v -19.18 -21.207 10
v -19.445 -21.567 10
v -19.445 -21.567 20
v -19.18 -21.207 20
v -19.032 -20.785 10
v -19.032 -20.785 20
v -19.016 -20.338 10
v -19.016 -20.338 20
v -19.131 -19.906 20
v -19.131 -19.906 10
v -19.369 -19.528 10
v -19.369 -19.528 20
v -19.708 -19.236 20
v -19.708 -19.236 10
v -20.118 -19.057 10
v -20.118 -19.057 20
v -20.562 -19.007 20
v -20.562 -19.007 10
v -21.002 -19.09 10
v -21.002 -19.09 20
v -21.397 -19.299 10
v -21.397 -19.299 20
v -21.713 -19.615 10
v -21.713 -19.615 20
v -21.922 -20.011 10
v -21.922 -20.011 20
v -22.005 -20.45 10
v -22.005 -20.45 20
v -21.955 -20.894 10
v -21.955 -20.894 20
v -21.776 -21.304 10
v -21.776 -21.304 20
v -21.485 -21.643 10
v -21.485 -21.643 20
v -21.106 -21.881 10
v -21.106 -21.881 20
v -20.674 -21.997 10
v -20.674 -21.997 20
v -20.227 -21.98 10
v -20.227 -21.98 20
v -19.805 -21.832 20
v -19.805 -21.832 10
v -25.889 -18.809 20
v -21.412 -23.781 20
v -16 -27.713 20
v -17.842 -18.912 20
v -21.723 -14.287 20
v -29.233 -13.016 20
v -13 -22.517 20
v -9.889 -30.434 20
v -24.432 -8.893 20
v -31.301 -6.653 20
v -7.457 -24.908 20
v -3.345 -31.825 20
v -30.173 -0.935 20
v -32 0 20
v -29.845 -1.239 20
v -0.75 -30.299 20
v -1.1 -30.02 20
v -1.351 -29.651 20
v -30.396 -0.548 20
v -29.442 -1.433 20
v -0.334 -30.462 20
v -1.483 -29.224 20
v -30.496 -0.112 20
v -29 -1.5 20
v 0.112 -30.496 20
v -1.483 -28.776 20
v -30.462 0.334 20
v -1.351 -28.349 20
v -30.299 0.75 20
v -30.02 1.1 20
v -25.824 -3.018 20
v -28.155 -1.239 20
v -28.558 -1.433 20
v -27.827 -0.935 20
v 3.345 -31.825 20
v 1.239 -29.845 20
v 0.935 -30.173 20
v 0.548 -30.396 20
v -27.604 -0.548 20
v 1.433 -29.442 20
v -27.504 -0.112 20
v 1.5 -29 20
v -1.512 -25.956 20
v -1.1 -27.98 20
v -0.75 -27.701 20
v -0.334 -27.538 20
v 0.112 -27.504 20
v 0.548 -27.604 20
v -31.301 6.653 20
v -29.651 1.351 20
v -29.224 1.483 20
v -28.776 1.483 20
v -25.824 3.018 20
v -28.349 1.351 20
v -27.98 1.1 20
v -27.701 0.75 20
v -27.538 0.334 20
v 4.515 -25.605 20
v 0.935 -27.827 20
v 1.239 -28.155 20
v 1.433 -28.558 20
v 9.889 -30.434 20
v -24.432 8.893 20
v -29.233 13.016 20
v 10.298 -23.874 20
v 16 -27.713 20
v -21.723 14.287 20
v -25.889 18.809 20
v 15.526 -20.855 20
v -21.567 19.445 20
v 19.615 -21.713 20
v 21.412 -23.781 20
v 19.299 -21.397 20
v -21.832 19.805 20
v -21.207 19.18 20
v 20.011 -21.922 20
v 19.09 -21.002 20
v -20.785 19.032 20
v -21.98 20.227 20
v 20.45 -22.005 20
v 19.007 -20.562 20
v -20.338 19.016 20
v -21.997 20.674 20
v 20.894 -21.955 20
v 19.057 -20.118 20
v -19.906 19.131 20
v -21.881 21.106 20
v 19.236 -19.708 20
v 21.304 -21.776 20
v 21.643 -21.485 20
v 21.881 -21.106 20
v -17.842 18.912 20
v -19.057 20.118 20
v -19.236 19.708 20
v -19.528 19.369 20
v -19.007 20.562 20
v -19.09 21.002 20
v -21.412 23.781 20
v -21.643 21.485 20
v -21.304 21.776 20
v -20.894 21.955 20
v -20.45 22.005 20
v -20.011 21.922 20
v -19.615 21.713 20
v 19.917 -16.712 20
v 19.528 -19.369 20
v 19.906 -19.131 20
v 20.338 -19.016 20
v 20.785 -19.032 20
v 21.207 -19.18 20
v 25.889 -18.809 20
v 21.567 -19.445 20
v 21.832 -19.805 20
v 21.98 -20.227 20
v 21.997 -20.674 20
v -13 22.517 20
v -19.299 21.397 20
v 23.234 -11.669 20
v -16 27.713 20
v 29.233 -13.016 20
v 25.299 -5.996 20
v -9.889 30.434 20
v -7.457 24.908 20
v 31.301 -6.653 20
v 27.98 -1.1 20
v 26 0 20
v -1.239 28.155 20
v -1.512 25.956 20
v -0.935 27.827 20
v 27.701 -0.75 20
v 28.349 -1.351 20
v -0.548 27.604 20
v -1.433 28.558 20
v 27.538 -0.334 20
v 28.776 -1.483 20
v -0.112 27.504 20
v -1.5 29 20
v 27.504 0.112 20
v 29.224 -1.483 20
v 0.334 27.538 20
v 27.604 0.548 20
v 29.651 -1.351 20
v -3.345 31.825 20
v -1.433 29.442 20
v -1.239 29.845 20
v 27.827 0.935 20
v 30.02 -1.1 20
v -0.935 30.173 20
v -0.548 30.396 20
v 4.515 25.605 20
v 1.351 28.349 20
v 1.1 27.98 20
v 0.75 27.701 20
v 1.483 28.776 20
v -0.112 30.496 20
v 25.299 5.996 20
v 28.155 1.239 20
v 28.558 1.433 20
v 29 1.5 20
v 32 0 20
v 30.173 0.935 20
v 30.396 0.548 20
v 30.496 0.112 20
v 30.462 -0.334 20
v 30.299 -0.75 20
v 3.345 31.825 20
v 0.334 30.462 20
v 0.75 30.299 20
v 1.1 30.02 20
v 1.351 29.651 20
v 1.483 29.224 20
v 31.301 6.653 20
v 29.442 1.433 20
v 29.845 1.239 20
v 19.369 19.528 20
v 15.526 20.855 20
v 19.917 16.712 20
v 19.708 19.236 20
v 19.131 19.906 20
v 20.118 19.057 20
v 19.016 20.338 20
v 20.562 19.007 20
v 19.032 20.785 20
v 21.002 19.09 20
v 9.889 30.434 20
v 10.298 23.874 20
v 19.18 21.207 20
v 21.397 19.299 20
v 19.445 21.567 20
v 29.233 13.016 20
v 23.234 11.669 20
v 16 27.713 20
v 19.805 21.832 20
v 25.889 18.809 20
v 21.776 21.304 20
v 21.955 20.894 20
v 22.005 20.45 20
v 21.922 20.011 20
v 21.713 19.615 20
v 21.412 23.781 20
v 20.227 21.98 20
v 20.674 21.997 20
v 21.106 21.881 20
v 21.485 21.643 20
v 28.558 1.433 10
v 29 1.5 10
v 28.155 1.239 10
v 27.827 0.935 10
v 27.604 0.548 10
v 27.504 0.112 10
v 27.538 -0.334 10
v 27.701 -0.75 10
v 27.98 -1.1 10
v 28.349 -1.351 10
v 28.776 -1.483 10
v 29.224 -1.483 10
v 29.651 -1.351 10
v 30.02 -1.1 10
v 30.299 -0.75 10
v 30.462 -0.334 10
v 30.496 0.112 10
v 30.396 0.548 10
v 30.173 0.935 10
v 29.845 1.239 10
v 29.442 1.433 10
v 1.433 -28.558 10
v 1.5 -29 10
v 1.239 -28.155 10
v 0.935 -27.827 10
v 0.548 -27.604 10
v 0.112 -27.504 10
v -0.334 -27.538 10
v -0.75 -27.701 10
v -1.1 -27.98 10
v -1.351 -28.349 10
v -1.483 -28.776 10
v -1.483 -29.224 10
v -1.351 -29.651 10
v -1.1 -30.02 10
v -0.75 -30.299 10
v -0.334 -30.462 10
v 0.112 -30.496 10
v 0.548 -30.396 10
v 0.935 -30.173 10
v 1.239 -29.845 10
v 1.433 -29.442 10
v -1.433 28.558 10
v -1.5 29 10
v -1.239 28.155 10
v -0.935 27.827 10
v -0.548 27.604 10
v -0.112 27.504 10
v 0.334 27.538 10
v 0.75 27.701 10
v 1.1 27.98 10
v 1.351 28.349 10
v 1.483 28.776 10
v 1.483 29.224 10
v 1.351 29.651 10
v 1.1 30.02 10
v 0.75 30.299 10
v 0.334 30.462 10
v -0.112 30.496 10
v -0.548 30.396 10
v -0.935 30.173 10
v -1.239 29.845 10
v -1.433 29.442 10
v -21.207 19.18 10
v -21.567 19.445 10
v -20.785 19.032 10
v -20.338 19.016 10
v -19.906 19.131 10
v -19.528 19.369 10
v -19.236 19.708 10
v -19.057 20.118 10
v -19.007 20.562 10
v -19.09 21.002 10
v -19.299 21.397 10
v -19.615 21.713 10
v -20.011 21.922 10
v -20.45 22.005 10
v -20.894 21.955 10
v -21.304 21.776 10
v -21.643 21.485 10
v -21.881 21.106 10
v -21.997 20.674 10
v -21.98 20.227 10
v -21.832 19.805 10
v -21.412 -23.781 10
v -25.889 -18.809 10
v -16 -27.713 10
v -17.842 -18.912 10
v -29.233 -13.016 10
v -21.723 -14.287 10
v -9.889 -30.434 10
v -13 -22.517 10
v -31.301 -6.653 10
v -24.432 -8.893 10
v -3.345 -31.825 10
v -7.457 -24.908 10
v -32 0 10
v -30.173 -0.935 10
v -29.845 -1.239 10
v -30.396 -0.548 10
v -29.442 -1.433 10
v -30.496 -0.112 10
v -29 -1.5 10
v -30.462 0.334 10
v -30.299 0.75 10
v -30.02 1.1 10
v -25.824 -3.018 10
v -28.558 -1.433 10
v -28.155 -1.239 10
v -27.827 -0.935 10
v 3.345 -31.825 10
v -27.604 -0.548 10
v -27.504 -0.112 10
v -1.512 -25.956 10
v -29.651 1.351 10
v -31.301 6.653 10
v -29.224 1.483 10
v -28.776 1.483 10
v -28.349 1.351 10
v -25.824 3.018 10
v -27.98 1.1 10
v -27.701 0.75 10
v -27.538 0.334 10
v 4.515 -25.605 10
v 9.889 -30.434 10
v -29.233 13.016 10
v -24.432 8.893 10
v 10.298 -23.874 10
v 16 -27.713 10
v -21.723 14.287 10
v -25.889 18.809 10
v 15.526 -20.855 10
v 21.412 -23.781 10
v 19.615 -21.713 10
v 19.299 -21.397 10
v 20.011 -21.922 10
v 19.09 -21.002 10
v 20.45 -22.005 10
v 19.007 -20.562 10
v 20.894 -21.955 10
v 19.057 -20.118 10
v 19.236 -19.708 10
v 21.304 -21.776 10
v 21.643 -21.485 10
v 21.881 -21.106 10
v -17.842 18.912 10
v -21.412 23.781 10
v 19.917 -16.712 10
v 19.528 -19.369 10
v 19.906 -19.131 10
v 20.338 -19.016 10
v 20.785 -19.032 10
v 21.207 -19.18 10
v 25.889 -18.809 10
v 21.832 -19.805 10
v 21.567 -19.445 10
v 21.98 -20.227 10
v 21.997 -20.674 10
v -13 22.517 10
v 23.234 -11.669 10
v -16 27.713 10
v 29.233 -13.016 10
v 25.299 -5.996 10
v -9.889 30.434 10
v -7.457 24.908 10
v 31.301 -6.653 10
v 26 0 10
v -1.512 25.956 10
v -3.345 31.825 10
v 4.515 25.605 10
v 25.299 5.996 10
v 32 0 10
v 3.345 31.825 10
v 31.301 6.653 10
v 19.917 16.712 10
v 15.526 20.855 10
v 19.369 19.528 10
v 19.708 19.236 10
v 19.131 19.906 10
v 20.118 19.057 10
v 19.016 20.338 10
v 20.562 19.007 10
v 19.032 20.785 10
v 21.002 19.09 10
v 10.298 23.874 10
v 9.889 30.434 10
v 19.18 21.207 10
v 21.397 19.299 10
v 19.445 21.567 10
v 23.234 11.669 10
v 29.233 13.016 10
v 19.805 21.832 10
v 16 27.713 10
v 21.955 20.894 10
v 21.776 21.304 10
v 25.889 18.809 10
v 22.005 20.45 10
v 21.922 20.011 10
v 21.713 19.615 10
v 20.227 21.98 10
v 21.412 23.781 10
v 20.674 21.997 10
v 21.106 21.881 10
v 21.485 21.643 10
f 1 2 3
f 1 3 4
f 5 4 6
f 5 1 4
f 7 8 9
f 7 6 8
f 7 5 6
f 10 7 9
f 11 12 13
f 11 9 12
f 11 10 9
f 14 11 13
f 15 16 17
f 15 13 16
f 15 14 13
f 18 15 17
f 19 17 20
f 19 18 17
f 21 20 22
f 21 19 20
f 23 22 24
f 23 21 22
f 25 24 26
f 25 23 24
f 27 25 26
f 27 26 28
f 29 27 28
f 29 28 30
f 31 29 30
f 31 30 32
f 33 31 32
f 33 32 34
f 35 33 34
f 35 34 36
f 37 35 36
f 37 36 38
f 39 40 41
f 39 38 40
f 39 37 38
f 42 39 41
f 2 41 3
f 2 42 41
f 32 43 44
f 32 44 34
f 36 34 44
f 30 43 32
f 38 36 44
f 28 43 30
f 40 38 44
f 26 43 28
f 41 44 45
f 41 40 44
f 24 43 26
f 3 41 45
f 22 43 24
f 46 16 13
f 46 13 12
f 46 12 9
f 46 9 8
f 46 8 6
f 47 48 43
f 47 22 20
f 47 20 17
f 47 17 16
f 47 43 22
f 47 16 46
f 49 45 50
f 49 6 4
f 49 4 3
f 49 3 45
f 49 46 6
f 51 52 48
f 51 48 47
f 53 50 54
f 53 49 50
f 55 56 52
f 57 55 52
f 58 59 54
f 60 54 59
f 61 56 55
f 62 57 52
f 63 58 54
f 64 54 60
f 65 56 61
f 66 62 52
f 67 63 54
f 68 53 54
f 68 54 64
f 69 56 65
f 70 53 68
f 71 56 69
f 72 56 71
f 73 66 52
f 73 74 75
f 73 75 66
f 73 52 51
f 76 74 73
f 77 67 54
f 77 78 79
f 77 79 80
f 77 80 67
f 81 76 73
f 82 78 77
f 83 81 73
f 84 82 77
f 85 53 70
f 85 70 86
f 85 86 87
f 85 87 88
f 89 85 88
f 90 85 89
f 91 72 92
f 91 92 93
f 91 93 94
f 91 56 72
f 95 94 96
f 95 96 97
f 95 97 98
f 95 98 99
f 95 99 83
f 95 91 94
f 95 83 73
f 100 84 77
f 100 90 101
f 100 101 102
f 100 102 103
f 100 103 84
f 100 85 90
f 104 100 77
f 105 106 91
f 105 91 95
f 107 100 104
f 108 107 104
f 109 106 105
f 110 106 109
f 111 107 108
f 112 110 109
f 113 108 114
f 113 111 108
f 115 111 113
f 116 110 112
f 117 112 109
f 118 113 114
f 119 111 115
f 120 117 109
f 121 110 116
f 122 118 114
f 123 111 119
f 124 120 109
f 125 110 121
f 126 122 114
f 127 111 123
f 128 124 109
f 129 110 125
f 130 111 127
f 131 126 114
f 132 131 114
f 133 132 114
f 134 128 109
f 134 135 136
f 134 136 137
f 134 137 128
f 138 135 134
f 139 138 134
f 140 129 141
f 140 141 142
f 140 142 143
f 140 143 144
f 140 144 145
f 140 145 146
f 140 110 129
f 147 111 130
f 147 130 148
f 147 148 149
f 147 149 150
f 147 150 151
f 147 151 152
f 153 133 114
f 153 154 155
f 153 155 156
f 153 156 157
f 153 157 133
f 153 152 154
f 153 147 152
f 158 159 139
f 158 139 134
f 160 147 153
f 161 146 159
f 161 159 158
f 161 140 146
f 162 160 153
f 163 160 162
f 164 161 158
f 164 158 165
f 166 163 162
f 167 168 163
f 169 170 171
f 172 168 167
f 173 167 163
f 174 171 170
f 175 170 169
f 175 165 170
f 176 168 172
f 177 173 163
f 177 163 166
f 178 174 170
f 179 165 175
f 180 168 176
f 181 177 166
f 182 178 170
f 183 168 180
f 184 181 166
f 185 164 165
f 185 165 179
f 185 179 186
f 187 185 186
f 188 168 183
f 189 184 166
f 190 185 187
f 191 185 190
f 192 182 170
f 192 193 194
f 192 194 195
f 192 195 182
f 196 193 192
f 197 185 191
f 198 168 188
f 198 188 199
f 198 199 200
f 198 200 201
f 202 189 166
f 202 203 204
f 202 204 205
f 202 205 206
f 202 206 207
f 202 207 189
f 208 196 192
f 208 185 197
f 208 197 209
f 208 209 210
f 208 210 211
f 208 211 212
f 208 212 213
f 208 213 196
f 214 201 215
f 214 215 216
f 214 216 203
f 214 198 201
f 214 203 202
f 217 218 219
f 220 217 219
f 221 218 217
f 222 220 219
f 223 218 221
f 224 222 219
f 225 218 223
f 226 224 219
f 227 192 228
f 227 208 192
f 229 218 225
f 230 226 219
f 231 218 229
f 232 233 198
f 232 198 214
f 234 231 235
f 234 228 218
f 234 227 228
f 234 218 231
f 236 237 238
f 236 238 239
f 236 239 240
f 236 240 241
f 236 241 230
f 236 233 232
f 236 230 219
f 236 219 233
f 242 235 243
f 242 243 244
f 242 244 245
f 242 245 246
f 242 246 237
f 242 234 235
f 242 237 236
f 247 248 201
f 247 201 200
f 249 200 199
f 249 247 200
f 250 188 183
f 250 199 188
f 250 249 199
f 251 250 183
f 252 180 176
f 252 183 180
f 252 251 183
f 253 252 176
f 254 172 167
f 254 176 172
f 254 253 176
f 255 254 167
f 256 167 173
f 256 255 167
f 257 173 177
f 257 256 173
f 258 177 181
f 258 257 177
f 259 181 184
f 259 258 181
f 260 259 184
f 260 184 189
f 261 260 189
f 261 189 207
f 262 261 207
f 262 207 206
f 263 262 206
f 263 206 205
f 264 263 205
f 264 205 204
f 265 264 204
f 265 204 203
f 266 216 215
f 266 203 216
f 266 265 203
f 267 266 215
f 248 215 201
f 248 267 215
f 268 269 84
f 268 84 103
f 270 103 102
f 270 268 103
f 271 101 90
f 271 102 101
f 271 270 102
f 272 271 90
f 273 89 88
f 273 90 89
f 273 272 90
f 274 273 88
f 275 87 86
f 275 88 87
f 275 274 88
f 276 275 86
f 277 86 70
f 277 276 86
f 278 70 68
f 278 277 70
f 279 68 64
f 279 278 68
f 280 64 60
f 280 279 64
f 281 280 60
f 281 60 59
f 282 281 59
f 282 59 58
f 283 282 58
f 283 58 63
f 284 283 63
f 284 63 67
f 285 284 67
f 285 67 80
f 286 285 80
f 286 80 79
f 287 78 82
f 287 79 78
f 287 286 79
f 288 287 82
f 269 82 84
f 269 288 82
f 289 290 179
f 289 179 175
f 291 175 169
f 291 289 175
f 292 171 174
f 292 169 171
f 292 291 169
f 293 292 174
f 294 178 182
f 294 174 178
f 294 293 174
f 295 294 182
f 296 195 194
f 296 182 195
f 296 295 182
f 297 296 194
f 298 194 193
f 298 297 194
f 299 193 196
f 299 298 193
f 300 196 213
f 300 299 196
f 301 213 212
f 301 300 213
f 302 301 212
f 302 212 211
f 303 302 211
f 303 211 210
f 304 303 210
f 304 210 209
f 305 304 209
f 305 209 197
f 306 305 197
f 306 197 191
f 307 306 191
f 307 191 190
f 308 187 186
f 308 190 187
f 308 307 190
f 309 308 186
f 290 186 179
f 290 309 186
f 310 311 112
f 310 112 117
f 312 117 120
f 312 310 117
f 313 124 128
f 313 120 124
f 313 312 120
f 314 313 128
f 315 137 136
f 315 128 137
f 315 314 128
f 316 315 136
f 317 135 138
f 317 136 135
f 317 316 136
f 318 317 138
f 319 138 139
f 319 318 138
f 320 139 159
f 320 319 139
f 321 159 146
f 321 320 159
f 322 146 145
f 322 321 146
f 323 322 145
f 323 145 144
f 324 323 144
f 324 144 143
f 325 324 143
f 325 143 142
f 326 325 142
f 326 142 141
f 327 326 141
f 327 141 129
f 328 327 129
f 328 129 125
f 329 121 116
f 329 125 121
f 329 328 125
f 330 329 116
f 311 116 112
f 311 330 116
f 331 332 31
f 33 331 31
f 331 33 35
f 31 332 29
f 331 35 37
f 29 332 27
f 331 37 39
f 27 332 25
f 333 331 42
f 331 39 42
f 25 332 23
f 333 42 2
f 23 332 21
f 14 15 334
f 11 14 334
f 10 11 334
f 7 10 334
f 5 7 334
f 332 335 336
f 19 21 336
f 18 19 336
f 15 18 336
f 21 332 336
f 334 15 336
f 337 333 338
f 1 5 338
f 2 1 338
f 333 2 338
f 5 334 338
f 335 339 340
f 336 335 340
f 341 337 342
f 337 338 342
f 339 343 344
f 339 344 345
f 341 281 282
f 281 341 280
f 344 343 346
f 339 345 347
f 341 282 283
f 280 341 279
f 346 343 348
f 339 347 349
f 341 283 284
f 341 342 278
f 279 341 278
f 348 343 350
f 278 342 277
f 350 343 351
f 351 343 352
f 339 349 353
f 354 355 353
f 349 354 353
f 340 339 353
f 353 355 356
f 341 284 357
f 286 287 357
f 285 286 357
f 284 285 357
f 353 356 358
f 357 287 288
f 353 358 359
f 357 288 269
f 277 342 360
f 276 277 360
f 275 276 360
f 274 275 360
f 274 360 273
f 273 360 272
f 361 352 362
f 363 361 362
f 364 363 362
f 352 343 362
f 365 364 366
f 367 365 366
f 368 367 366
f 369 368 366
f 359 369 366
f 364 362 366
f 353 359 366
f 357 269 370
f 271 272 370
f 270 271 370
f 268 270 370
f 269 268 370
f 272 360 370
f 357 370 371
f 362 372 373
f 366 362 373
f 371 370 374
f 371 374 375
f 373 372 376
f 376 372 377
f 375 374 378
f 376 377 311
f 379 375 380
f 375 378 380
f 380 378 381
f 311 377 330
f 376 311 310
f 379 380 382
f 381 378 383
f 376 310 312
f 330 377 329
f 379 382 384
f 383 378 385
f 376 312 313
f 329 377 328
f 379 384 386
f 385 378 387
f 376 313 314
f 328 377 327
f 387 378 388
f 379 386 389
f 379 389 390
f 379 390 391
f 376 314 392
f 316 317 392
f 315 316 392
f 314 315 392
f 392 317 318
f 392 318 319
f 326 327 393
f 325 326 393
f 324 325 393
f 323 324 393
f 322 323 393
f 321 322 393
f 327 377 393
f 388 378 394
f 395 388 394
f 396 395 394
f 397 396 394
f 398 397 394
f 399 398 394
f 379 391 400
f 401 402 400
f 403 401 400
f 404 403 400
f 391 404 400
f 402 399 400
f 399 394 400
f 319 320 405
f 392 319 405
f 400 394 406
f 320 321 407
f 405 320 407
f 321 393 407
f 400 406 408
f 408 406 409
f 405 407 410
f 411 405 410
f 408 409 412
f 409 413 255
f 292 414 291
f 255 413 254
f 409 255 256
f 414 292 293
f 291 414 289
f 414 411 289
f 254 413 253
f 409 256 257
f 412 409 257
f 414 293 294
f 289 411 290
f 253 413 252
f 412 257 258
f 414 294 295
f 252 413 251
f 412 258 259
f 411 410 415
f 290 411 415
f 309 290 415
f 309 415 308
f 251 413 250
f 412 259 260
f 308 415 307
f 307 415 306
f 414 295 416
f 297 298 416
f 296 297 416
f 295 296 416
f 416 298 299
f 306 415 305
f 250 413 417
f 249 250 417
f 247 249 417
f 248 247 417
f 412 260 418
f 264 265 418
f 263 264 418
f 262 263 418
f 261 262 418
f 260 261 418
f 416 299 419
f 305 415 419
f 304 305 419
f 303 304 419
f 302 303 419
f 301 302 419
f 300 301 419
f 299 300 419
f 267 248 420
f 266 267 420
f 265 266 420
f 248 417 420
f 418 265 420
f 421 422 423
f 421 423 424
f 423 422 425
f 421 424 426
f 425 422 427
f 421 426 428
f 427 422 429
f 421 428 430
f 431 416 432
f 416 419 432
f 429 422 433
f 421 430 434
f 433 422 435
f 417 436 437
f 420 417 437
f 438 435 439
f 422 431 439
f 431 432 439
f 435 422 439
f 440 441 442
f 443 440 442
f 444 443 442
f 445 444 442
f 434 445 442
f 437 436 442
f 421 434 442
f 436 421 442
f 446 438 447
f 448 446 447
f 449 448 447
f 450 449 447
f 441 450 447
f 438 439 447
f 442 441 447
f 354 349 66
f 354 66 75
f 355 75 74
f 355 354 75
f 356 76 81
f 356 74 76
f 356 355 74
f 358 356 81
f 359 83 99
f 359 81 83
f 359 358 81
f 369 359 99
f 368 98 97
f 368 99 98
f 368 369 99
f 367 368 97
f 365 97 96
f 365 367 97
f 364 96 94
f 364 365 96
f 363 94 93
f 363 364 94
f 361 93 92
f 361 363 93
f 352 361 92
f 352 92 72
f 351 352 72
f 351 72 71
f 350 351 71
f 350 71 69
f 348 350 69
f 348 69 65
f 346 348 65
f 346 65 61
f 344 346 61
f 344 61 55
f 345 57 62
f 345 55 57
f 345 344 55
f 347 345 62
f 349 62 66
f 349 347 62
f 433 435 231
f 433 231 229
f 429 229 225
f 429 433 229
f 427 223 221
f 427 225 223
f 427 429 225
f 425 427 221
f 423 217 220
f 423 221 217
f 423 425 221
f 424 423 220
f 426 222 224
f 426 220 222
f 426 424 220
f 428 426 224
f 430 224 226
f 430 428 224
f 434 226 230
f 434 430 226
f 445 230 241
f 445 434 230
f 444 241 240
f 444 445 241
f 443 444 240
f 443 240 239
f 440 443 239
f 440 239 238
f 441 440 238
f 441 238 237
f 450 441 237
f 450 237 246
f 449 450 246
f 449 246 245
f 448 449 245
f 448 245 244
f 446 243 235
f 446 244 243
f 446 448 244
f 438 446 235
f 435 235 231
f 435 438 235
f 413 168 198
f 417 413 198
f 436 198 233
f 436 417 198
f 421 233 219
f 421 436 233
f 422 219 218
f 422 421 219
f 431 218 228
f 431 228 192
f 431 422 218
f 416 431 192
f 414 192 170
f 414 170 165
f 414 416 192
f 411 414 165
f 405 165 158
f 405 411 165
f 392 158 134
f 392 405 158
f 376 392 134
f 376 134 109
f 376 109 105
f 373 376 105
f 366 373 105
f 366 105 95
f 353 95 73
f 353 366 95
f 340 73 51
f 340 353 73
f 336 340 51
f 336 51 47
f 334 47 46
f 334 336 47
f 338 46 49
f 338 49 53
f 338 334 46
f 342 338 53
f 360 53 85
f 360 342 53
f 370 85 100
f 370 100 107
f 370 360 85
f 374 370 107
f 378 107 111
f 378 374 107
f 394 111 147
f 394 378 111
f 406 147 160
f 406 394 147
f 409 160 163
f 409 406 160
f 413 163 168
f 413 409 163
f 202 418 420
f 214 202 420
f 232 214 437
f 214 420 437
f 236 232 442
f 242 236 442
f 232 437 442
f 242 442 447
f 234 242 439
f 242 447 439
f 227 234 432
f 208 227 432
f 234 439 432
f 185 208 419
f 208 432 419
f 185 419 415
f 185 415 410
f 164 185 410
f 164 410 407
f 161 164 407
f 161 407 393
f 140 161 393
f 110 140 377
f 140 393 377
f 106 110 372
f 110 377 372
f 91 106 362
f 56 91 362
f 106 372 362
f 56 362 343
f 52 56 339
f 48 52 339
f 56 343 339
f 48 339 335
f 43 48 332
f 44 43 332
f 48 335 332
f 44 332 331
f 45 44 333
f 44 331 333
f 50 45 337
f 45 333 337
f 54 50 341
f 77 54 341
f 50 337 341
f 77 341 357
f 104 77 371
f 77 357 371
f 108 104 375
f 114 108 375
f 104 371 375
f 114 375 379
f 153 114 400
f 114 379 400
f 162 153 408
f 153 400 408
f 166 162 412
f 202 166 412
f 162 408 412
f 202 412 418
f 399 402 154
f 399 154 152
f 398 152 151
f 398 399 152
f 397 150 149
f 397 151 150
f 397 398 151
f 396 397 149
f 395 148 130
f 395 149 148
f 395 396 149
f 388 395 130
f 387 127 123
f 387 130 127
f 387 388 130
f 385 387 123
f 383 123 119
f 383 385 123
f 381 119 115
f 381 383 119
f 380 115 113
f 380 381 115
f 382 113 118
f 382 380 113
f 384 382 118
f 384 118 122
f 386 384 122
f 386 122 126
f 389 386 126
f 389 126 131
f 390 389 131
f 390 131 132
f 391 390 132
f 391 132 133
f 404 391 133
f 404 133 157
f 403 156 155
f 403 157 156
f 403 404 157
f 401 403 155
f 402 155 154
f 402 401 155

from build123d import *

# Parameters (mm, degrees)
CYLINDER188_R               = 1.5
CYLINDER188_DEPTH           = 30
CYLINDER188_PLACEMENT_ANGLE = 45
CYLINDER189_R               = 1.5
CYLINDER189_DEPTH           = 30
CYLINDER190_R               = 1.5
CYLINDER190_DEPTH           = 30
CYLINDER190_PLACEMENT_ANGLE = 135
CYLINDER191_R               = 1.5
CYLINDER191_DEPTH           = 30
CYLINDER192_R               = 1.5
CYLINDER192_DEPTH           = 30
CYLINDER192_PLACEMENT_ANGLE = 225
CYLINDER193_R               = 1.5
CYLINDER193_DEPTH           = 30
CYLINDER194_R               = 1.5
CYLINDER194_DEPTH           = 30
CYLINDER194_PLACEMENT_ANGLE = 45
CYLINDER187_R               = 1.5
CYLINDER187_DEPTH           = 30
TUBE012_R                   = 32
TUBE012_R_2                 = 26
TUBE012_DEPTH               = 10


with BuildPart() as v_lec188:
    # Cylinder188 → Cylinder188 (new body)
    with BuildSketch(Plane.XY):
        Circle(CYLINDER188_R)
    extrude(amount=CYLINDER188_DEPTH)


with BuildPart() as v_lec188_1:
    # Cylinder188 placement: moved
    add(v_lec188.part.moved(Location((20.506097, -20.506097, 0))).rotate(Axis((20.506097, -20.506097, 0), (0, 0, 1)), CYLINDER188_PLACEMENT_ANGLE))


with BuildPart() as v_lec189:
    # Cylinder189 → Cylinder189 (new body)
    with BuildSketch(Plane(origin=(29, 0, 0), x_dir=(0, 1, 0), z_dir=(0, 0, 1))):
        Circle(CYLINDER189_R)
    extrude(amount=CYLINDER189_DEPTH)


with BuildPart() as v_lec190:
    # Cylinder190 → Cylinder190 (new body)
    with BuildSketch(Plane.XY):
        Circle(CYLINDER190_R)
    extrude(amount=CYLINDER190_DEPTH)


with BuildPart() as v_lec190_1:
    # Cylinder190 placement: moved
    add(v_lec190.part.moved(Location((20.506097, 20.506097, 0))).rotate(Axis((20.506097, 20.506097, 0), (0, 0, 1)), CYLINDER190_PLACEMENT_ANGLE))


with BuildPart() as v_lec191:
    # Cylinder191 → Cylinder191 (new body)
    with BuildSketch(Plane(origin=(0, 29, 0), x_dir=(-1, 0, 0), z_dir=(0, 0, 1))):
        Circle(CYLINDER191_R)
    extrude(amount=CYLINDER191_DEPTH)


with BuildPart() as v_lec192:
    # Cylinder192 → Cylinder192 (new body)
    with BuildSketch(Plane.XY):
        Circle(CYLINDER192_R)
    extrude(amount=CYLINDER192_DEPTH)


with BuildPart() as v_lec192_1:
    # Cylinder192 placement: moved
    add(v_lec192.part.moved(Location((-20.506097, 20.506097, 0))).rotate(Axis((-20.506097, 20.506097, 0), (0, 0, 1)), CYLINDER192_PLACEMENT_ANGLE))


with BuildPart() as v_lec193:
    # Cylinder193 → Cylinder193 (new body)
    with BuildSketch(Plane(origin=(-29, 0, 0), x_dir=(0, -1, 0), z_dir=(0, 0, 1))):
        Circle(CYLINDER193_R)
    extrude(amount=CYLINDER193_DEPTH)


with BuildPart() as v_lec194:
    # Cylinder194 → Cylinder194 (new body)
    with BuildSketch(Plane.XY):
        Circle(CYLINDER194_R)
    extrude(amount=CYLINDER194_DEPTH)


with BuildPart() as v_lec194_1:
    # Cylinder194 placement: moved
    add(v_lec194.part.moved(Location((-20.506097, -20.506097, 0))).rotate(Axis((-20.506097, -20.506097, 0), (0, 0, -1)), CYLINDER194_PLACEMENT_ANGLE))


with BuildPart() as compound544:
    # Cylinder187 → Cylinder187 (new body)
    with BuildSketch(Plane(origin=(0, -29, 0), x_dir=(1, 0, 0), z_dir=(0, 0, 1))):
        Circle(CYLINDER187_R)
    extrude(amount=CYLINDER187_DEPTH)

    # Compound544: union Válec188, Válec189, Válec190, Válec191, Válec192, Válec193, Válec194
    add(v_lec188_1.part)
    add(v_lec189.part)
    add(v_lec190_1.part)
    add(v_lec191.part)
    add(v_lec192_1.part)
    add(v_lec193.part)
    add(v_lec194_1.part)


with BuildPart() as cut318:
    # Tube012 → Tube012 (new body)
    with BuildSketch(Plane.XY.offset(10)):
        Circle(TUBE012_R)
        Circle(TUBE012_R_2, mode=Mode.SUBTRACT)
    extrude(amount=TUBE012_DEPTH)

    # Cut318: cut Compound544
    add(compound544.part, mode=Mode.SUBTRACT)


solid = cut318.part
